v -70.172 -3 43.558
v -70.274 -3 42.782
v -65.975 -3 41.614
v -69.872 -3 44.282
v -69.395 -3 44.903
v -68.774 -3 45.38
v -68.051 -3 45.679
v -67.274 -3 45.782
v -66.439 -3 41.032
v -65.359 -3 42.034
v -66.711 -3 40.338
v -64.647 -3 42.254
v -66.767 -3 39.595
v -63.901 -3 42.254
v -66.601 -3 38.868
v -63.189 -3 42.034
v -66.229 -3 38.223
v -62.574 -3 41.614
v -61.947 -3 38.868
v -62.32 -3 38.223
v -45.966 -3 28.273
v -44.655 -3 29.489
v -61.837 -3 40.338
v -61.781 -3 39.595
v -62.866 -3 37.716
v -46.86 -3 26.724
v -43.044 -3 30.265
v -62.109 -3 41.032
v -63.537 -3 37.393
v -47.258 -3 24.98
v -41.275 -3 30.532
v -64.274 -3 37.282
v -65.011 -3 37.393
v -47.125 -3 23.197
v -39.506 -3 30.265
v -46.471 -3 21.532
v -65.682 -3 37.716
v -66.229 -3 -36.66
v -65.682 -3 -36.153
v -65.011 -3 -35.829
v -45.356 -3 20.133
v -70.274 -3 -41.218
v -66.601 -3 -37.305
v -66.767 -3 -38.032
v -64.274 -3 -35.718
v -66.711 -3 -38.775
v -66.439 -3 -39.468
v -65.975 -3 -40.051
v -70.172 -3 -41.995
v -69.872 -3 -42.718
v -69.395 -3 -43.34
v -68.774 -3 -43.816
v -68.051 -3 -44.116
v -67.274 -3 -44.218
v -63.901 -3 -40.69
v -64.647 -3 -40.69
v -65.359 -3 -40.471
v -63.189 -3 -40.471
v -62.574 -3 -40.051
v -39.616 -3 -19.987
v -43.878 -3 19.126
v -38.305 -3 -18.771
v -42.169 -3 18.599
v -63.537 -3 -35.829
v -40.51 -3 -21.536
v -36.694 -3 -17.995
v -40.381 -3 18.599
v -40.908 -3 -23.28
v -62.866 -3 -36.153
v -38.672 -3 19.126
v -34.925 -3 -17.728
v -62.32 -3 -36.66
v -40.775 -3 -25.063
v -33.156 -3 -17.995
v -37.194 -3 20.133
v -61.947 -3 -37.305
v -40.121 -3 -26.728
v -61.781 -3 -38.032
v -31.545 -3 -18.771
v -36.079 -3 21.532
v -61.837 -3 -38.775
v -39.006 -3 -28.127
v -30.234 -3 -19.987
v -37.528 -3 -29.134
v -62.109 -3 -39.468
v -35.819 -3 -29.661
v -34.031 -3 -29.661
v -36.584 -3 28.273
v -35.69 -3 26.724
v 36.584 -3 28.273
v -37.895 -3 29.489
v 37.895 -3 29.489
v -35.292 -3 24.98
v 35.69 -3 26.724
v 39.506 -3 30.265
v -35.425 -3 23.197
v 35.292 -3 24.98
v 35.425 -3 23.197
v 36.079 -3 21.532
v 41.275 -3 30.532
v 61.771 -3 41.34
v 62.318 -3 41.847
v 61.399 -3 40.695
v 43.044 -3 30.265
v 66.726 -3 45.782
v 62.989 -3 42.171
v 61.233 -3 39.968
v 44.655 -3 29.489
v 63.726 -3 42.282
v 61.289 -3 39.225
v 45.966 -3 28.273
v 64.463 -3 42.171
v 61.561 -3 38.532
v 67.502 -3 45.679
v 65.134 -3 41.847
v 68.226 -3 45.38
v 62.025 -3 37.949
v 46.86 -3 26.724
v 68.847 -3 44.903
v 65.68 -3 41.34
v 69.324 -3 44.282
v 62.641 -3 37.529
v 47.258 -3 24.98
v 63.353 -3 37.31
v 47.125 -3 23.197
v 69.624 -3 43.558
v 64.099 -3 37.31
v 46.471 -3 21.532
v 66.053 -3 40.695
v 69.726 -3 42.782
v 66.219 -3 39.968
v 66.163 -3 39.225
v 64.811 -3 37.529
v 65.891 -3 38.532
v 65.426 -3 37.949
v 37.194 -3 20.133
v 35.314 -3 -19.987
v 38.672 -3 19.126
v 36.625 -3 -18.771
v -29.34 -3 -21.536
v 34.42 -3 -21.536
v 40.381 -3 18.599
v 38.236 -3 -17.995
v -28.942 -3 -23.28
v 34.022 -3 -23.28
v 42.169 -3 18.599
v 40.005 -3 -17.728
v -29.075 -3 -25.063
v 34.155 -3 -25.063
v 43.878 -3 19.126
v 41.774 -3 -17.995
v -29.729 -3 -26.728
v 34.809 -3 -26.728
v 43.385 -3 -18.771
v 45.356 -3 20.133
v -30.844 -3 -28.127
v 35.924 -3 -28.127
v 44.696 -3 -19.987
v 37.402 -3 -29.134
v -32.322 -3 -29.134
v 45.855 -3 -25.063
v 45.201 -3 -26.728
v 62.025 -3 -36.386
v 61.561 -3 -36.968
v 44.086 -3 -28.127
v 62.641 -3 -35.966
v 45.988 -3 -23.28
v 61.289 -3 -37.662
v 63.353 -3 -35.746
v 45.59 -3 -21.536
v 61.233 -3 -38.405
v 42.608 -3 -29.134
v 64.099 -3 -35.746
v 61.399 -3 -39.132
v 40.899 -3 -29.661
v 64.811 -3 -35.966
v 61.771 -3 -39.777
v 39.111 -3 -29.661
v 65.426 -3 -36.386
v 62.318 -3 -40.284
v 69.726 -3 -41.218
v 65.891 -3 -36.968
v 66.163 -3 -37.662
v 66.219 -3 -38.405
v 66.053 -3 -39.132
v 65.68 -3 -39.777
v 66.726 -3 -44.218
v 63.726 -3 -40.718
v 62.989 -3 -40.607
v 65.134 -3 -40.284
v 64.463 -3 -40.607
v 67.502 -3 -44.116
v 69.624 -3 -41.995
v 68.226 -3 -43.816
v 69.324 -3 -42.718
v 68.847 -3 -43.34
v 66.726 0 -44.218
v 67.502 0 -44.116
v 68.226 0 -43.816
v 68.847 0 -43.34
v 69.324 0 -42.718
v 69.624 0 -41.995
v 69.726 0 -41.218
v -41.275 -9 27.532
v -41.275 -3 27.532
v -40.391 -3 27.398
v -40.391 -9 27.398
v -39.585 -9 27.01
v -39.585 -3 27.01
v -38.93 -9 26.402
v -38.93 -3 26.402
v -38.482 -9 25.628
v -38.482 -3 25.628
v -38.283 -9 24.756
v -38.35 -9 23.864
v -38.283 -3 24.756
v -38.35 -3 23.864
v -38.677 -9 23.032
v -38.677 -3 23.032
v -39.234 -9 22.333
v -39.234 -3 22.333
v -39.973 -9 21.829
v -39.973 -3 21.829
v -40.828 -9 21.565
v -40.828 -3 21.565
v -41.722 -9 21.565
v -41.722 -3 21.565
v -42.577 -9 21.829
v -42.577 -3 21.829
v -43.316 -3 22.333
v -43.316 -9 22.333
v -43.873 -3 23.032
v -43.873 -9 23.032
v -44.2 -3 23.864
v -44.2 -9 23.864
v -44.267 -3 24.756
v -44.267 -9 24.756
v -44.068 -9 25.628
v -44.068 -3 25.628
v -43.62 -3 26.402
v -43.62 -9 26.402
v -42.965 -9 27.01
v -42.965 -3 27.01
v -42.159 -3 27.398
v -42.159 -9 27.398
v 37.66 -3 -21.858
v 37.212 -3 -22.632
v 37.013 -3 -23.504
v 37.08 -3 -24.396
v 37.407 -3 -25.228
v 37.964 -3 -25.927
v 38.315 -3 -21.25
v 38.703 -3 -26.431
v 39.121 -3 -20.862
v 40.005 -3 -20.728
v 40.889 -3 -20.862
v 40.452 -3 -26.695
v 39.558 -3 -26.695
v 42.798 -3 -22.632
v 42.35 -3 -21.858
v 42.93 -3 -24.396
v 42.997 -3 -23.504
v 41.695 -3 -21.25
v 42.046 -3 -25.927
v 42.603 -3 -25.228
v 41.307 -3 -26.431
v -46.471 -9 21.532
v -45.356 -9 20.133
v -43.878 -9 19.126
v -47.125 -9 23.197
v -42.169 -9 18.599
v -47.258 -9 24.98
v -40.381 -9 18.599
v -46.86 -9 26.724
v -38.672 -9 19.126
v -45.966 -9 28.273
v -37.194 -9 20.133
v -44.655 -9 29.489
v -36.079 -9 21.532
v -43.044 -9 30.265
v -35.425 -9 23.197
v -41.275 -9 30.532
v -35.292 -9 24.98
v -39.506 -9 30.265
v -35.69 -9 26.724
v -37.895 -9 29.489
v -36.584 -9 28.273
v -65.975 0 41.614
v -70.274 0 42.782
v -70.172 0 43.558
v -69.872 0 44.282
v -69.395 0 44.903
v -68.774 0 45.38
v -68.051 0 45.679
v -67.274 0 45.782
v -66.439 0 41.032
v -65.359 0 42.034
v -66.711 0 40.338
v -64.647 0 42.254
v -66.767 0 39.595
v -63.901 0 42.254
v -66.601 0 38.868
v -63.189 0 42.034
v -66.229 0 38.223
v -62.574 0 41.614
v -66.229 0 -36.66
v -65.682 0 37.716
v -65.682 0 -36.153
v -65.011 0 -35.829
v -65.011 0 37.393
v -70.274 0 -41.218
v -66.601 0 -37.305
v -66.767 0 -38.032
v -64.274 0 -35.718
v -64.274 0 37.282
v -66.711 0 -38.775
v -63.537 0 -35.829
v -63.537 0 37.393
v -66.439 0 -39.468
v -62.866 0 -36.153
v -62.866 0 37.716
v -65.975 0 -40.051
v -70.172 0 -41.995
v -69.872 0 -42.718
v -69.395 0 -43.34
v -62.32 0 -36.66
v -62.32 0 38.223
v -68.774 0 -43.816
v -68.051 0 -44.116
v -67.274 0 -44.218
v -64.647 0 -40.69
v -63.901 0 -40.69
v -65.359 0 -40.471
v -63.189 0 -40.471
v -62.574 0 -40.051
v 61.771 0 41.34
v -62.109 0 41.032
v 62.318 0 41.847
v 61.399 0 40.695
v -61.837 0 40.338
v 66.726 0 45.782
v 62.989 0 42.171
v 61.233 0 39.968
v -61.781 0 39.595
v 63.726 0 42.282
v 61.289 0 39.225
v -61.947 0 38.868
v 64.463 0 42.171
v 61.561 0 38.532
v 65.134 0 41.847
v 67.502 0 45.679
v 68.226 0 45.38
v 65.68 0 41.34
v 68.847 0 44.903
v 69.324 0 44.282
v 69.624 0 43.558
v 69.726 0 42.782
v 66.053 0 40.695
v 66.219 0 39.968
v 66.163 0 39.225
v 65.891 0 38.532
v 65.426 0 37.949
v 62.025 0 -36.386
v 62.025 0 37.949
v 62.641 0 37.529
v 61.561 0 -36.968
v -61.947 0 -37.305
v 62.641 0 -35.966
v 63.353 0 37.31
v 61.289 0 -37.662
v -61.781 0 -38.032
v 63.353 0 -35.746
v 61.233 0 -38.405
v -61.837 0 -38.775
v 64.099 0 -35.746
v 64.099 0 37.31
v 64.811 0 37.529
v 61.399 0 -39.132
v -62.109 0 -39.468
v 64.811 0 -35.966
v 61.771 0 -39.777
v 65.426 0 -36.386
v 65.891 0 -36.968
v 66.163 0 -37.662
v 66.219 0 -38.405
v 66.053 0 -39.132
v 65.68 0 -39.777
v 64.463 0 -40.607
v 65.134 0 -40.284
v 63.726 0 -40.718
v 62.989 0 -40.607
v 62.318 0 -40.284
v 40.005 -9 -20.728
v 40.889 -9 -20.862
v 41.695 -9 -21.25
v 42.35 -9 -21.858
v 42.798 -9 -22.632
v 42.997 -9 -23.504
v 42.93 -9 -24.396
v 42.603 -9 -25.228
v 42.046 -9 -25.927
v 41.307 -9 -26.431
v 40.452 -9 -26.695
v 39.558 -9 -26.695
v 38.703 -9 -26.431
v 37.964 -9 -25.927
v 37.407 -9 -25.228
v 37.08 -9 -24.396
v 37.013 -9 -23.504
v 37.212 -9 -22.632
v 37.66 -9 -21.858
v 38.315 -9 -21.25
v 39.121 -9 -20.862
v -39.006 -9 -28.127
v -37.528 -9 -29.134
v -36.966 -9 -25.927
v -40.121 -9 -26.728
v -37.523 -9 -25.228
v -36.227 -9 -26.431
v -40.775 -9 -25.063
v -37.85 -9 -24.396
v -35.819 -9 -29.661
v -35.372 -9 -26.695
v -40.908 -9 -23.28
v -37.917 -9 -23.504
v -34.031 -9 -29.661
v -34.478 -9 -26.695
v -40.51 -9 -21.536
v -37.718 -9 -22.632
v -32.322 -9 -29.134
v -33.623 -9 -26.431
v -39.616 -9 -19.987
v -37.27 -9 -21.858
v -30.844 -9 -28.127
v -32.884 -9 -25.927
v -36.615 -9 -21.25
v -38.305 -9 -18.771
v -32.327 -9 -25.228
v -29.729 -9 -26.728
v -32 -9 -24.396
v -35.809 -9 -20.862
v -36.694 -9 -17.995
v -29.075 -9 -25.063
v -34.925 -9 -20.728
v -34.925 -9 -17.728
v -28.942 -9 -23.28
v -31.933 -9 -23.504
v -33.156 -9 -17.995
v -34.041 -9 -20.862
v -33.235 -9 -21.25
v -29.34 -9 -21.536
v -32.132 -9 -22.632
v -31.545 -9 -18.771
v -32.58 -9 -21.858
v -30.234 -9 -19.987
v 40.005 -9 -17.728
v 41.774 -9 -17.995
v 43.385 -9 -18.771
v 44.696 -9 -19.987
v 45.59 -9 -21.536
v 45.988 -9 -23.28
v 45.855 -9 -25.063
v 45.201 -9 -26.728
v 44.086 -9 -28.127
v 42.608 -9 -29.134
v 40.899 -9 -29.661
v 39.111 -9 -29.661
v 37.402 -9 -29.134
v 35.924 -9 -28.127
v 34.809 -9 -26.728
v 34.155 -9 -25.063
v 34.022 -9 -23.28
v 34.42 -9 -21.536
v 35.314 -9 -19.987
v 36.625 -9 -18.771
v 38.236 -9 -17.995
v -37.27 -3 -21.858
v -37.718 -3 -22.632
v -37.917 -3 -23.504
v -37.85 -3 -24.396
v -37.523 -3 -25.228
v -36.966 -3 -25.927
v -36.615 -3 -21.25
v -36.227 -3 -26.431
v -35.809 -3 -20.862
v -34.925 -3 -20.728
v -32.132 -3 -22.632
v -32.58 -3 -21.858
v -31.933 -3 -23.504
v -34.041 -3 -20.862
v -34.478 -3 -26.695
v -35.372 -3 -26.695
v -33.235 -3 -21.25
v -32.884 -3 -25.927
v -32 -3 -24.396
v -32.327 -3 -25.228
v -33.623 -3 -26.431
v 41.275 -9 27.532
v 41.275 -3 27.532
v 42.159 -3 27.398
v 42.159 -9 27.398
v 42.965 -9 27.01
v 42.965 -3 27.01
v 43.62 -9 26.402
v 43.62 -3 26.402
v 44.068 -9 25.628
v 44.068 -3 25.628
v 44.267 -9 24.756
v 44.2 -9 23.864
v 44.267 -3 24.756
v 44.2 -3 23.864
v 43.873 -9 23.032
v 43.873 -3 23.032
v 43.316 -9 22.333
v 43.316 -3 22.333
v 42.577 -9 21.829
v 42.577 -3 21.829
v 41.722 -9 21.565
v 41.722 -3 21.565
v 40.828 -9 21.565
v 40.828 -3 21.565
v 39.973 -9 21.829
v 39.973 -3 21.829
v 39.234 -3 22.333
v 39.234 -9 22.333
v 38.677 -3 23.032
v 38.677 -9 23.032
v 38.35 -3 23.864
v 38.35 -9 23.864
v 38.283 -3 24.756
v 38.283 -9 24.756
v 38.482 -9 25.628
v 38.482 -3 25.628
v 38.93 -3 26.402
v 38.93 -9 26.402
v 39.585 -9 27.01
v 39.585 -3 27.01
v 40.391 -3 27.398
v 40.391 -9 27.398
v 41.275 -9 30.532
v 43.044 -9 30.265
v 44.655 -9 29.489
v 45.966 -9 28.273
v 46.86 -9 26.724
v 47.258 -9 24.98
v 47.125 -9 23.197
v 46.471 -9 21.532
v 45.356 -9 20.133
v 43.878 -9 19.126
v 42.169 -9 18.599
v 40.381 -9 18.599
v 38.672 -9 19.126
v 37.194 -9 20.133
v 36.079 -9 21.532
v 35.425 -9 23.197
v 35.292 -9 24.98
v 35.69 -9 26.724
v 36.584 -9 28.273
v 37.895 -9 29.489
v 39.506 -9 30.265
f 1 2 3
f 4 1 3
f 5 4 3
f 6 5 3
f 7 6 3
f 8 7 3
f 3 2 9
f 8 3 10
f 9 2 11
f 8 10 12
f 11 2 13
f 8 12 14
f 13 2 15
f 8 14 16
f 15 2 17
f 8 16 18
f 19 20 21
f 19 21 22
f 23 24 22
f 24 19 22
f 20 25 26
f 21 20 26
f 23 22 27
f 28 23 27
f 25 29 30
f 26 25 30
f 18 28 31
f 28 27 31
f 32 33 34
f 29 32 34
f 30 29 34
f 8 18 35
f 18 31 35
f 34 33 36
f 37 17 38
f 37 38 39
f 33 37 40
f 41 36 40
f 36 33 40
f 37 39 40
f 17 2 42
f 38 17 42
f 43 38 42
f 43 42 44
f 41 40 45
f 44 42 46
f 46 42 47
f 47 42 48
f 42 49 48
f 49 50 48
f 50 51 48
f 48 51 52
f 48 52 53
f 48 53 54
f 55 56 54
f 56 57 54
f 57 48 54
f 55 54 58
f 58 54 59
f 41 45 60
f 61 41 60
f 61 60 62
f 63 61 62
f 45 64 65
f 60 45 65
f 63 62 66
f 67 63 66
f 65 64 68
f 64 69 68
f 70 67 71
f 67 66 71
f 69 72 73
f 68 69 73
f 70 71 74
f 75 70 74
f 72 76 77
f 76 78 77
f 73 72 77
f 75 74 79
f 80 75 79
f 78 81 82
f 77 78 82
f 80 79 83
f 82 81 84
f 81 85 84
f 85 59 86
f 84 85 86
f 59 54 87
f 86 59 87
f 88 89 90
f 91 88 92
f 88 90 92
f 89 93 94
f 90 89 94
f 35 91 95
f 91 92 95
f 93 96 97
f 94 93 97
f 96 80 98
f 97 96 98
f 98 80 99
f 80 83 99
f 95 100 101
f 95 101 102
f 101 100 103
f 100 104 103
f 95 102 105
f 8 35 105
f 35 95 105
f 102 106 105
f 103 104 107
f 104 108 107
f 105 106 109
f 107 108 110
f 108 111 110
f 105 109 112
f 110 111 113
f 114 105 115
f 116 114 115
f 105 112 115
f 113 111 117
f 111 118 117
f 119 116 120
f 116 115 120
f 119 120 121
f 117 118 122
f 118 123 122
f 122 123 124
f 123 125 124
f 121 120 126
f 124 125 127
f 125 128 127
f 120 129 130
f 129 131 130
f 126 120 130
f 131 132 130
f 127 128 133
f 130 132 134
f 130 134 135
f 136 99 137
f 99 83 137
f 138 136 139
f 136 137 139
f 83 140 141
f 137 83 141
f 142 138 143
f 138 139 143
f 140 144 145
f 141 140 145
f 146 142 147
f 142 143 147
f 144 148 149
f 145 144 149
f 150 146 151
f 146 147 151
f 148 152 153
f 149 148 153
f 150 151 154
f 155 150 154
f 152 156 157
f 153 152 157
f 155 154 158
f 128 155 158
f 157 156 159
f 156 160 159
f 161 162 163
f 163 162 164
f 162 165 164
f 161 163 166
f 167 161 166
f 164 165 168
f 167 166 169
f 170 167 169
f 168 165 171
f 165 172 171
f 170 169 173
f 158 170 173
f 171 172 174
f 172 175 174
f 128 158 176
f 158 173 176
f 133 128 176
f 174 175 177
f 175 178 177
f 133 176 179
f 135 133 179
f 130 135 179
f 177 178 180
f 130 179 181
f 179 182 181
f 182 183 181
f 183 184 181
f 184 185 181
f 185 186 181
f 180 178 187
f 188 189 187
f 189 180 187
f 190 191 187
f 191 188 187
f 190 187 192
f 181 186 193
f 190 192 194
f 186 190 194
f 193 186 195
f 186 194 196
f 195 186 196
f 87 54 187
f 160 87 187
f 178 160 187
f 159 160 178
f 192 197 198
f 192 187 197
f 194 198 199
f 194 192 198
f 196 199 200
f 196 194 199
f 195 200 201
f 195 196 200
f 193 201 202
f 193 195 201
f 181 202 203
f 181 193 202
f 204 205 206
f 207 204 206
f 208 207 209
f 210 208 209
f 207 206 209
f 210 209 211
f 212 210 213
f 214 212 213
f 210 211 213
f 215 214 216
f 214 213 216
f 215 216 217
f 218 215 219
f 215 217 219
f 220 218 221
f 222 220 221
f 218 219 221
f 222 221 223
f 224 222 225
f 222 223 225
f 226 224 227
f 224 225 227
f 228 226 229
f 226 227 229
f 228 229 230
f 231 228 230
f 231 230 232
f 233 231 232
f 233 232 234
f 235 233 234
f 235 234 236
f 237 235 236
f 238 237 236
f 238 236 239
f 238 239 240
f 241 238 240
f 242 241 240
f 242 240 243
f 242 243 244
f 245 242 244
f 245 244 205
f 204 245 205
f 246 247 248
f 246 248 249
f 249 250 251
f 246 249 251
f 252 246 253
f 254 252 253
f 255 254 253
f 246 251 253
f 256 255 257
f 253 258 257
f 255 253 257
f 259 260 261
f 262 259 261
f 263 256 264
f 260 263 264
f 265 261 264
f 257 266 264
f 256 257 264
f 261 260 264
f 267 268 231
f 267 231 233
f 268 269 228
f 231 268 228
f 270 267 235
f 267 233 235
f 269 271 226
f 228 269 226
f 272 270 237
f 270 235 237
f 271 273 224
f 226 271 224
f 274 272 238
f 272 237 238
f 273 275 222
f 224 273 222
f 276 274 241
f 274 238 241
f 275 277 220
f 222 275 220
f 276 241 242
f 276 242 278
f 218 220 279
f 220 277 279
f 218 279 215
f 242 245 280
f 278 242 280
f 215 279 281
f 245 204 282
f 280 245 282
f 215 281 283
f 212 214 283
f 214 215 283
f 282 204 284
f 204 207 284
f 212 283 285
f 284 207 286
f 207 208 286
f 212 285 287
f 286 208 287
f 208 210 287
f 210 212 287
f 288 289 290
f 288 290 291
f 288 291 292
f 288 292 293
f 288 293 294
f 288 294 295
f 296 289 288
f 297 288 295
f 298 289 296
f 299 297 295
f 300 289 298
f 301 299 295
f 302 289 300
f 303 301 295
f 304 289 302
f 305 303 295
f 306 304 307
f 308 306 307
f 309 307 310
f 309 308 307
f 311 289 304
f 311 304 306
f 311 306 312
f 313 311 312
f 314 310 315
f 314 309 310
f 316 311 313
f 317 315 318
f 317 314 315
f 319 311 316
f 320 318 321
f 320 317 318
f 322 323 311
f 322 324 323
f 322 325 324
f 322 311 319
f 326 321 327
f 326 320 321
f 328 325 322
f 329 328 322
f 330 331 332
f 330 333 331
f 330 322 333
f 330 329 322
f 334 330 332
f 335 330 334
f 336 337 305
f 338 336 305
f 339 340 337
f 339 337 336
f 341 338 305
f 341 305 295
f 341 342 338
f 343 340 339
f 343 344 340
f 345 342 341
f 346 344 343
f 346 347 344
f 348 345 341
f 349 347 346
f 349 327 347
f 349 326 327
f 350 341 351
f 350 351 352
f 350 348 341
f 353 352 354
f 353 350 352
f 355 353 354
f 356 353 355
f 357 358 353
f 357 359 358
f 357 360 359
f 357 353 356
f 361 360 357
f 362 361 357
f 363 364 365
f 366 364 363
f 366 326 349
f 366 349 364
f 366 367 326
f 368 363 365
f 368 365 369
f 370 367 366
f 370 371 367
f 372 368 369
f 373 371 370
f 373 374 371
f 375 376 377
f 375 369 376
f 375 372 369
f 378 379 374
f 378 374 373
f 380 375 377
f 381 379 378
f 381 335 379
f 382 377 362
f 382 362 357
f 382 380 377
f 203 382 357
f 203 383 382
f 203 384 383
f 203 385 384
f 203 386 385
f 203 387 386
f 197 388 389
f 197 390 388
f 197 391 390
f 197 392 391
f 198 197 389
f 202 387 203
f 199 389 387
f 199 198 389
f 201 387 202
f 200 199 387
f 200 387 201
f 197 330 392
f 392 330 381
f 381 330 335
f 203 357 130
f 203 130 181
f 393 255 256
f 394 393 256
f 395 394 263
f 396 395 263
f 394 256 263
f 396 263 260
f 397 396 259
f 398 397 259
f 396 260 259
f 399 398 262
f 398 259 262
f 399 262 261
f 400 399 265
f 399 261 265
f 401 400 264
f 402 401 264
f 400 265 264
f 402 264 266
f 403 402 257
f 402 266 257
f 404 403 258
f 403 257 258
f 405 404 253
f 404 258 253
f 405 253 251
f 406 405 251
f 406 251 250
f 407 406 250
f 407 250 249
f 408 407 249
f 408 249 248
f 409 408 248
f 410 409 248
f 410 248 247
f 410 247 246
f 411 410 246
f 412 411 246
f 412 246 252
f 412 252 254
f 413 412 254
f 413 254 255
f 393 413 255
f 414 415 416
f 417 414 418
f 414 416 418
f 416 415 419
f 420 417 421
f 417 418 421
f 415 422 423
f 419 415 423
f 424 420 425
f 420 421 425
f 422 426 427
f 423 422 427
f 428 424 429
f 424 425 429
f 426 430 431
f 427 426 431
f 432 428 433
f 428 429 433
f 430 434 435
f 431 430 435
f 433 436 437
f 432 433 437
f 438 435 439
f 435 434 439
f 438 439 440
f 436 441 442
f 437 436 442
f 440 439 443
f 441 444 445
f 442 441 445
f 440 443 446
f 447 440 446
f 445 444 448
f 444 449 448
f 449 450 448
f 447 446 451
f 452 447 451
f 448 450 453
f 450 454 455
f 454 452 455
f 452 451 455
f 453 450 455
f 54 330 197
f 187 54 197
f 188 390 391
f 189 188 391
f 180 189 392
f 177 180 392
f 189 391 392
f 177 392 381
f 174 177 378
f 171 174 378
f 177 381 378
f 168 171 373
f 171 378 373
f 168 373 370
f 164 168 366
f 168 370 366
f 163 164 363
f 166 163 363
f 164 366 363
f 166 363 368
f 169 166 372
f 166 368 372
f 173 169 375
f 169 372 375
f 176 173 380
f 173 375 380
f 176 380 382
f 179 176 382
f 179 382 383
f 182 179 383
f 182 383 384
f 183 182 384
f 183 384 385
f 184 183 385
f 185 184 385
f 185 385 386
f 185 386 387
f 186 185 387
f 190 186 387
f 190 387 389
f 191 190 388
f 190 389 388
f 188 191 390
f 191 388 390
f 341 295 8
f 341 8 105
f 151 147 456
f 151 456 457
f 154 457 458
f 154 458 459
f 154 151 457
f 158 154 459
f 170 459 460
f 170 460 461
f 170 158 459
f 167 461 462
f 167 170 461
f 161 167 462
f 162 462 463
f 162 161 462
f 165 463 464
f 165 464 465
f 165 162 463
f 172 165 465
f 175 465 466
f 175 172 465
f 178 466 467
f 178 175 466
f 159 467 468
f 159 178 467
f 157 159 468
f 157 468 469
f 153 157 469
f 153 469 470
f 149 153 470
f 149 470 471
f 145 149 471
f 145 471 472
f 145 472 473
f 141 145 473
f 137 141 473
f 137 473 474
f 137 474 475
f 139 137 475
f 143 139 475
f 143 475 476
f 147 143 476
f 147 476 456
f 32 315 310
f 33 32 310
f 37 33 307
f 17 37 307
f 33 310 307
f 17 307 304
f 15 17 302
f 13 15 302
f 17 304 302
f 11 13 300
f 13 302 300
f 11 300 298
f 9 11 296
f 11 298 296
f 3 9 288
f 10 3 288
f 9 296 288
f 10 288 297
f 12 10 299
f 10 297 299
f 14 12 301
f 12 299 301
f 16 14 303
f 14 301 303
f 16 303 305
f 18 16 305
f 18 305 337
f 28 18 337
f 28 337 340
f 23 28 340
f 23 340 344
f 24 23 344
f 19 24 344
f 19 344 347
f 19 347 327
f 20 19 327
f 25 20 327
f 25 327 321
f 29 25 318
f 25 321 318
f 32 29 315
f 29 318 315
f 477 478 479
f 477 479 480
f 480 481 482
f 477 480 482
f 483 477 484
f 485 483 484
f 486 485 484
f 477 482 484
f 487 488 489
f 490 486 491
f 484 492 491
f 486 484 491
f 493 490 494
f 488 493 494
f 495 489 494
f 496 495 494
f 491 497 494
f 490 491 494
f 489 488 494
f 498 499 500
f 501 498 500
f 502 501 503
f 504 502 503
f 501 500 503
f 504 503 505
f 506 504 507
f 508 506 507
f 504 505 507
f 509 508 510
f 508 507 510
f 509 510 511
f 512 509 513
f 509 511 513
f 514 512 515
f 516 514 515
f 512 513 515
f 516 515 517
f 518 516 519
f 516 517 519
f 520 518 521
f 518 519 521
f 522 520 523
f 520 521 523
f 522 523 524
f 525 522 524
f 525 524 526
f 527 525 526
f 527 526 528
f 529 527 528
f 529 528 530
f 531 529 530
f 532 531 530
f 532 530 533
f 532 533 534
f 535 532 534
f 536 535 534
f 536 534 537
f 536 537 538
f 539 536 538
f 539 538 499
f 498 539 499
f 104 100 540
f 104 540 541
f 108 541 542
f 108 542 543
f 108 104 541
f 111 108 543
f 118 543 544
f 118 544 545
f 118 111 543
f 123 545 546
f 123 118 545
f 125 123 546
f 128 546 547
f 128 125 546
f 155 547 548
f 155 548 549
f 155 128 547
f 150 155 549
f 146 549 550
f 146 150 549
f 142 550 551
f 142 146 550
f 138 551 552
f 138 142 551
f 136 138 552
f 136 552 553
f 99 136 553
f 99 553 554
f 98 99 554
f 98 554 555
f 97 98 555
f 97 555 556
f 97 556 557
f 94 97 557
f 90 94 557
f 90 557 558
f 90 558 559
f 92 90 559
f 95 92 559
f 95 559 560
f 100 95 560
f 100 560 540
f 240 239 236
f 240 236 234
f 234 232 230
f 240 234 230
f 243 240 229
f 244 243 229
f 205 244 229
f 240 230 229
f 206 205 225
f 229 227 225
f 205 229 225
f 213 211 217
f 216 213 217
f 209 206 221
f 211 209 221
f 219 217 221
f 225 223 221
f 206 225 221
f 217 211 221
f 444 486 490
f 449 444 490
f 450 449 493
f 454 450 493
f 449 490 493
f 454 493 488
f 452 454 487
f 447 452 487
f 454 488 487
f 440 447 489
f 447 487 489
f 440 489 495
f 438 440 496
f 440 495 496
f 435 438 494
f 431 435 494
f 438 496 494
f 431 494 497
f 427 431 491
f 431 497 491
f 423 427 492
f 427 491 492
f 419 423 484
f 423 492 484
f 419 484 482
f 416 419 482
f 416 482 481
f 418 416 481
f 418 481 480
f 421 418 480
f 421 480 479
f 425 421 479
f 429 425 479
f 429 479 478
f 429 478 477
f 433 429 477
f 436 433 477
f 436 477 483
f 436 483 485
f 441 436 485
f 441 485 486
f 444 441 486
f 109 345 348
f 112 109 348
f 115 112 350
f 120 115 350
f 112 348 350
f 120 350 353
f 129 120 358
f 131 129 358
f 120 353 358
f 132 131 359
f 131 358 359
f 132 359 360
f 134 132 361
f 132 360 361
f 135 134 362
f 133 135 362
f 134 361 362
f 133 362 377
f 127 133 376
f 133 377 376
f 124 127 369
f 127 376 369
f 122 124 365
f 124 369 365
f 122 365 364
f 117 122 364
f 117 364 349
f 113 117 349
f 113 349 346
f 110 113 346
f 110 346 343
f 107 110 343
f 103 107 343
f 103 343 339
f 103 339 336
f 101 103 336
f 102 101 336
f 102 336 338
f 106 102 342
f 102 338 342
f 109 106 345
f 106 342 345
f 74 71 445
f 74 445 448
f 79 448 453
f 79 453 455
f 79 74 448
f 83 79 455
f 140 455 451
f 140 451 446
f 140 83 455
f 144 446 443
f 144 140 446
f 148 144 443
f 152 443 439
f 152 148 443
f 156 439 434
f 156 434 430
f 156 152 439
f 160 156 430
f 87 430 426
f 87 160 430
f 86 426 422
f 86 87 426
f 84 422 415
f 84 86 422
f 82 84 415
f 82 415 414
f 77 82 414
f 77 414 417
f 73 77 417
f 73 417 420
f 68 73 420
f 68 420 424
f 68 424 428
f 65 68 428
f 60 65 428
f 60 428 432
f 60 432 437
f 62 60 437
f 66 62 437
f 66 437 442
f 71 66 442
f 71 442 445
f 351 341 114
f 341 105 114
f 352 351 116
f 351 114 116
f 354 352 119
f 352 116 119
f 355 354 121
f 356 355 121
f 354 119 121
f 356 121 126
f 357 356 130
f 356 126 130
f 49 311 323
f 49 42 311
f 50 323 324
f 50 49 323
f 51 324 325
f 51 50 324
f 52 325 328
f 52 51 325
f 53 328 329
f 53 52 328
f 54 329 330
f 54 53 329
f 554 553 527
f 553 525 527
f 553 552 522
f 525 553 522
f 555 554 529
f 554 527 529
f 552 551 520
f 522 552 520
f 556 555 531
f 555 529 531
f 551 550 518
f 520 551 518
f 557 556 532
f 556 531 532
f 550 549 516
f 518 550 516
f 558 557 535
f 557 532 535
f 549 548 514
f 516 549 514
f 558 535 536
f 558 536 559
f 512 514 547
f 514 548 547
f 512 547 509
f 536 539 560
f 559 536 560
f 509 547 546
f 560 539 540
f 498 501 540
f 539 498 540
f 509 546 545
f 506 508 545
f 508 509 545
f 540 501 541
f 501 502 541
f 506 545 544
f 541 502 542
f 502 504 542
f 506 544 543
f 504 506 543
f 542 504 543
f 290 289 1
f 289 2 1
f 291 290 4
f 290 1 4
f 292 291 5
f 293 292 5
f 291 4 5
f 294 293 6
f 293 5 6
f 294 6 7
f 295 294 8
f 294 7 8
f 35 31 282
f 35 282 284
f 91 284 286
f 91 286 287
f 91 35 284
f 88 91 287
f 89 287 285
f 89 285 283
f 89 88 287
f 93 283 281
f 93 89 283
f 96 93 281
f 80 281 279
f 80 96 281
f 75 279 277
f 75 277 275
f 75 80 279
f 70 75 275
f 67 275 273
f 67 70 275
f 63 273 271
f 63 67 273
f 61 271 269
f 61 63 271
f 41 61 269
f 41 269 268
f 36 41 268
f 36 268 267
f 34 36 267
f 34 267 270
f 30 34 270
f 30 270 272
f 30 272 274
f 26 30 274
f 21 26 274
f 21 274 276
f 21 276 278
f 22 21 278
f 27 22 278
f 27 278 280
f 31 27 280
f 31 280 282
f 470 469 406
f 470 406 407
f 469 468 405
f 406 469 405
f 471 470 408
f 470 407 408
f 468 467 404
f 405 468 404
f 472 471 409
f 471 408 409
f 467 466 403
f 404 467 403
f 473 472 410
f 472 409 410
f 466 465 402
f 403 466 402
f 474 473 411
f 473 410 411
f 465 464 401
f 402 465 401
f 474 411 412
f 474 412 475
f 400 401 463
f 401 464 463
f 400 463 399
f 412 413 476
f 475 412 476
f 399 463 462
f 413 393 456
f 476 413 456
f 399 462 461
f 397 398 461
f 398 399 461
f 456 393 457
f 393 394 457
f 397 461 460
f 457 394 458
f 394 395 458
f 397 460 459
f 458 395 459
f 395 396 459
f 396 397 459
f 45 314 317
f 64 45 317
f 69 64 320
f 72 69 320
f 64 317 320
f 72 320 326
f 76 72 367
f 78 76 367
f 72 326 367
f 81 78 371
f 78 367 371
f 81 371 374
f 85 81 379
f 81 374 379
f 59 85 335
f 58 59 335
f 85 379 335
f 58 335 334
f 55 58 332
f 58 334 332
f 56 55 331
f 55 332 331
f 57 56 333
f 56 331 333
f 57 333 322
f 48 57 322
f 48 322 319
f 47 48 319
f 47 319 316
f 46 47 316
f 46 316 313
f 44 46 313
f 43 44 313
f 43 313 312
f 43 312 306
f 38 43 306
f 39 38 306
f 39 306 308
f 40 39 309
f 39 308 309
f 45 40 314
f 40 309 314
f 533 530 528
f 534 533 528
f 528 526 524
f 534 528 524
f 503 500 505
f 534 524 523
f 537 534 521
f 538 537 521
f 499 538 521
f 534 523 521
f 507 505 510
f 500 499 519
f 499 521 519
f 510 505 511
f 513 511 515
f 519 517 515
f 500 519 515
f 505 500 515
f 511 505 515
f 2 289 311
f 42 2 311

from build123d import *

# Parameters (mm, degrees)
SKETCH_1_R        = 6
SKETCH_1_R_2      = 3
EXTRUDE_1_DEPTH   = 9
EXTRUDE_1_2_DEPTH = 9
EXTRUDE_1_3_DEPTH = 9
EXTRUDE_1_4_DEPTH = 9
SKETCH_2_W        = 140
SKETCH_2_H        = 90
SKETCH_2_R        = 2.5
EXTRUDE_2_DEPTH   = 3
FILLET_1_R        = 3


with BuildPart() as part:
    # Эскиз1 → Бобышка-Вытянуть1 (new body)
    with BuildSketch(Plane(origin=(0, 0, 0), x_dir=(1, 0, 0), z_dir=(0, 1, 0))):
        with Locations(Location((-34.925000029, 23.728220461, 0), (0, 0, 270))):
            Circle(SKETCH_1_R)
        with Locations(Location((-34.925000029, 23.728220461, 0), (0, 0, 270))):
            Circle(SKETCH_1_R_2, mode=Mode.SUBTRACT)
    extrude(amount=-EXTRUDE_1_DEPTH)



with BuildPart() as body_2:
    # Эскиз1 → Extrude 1 2 (new body)
    with BuildSketch(Plane(origin=(0, 0, 0), x_dir=(1, 0, 0), z_dir=(0, 1, 0))):
        with Locations(Location((40.004999984, 23.728220453, 0), (0, 0, 270))):
            Circle(SKETCH_1_R)
        with Locations(Location((40.004999984, 23.728220453, 0), (0, 0, 270))):
            Circle(SKETCH_1_R_2, mode=Mode.SUBTRACT)
    extrude(amount=-EXTRUDE_1_2_DEPTH)


with BuildPart() as body_3:
    # Эскиз1 → Extrude 1 3 (new body)
    with BuildSketch(Plane(origin=(0, 0, 0), x_dir=(1, 0, 0), z_dir=(0, 1, 0))):
        with Locations(Location((41.275000034, -24.53177948, 0), (0, 0, 270))):
            Circle(SKETCH_1_R)
        with Locations(Location((41.275000034, -24.53177948, 0), (0, 0, 270))):
            Circle(SKETCH_1_R_2, mode=Mode.SUBTRACT)
    extrude(amount=-EXTRUDE_1_3_DEPTH)


with BuildPart() as body_4:
    # Эскиз1 → Extrude 1 4 (new body)
    with BuildSketch(Plane(origin=(0, 0, 0), x_dir=(1, 0, 0), z_dir=(0, 1, 0))):
        with Locations(Location((-41.275000034, -24.531779532, 0), (0, 0, 270))):
            Circle(SKETCH_1_R)
        with Locations(Location((-41.275000034, -24.531779532, 0), (0, 0, 270))):
            Circle(SKETCH_1_R_2, mode=Mode.SUBTRACT)
    extrude(amount=-EXTRUDE_1_4_DEPTH)


with BuildPart() as part_1:
    add(part.part)

    add(body_2.part)  # Бобышка-Вытянуть2 merges body 2

    add(body_3.part)  # Бобышка-Вытянуть2 merges body 3

    add(body_4.part)  # Бобышка-Вытянуть2 merges body 4
    # Эскиз2 → Бобышка-Вытянуть2 (add)
    with BuildSketch(Plane(origin=(0, 0, 0), x_dir=(1, 0, 0), z_dir=(0, 1, 0))):
        with Locations((-0.274084252, -0.781638626)):
            Rectangle(SKETCH_2_W, SKETCH_2_H)
        with Locations(Location((-64.274084252, 38.218361374, 0), (0, 0, 270))):
            Circle(SKETCH_2_R, mode=Mode.SUBTRACT)
        with Locations(Location((63.725915748, 38.218361374, 0), (0, 0, 90))):
            Circle(SKETCH_2_R, mode=Mode.SUBTRACT)
        with Locations(Location((63.725915748, -39.781638626, 0), (0, 0, 270))):
            Circle(SKETCH_2_R, mode=Mode.SUBTRACT)
        with Locations(Location((-64.274084252, -39.781638626, 0), (0, 0, 90))):
            Circle(SKETCH_2_R, mode=Mode.SUBTRACT)
    extrude(amount=-EXTRUDE_2_DEPTH)

    # Скругление1
    fillet_1_edges = [part_1.edges().sort_by_distance(p)[0] for p in [
        (69.725915748, -1.5, -44.218361374),
        (69.725915748, -1.5, 45.781638626),
        (-70.274084252, -1.5, 45.781638626),
        (-70.274084252, -1.5, -44.218361374),
    ]]
    fillet(fillet_1_edges, radius=FILLET_1_R)


solid = part_1.part
